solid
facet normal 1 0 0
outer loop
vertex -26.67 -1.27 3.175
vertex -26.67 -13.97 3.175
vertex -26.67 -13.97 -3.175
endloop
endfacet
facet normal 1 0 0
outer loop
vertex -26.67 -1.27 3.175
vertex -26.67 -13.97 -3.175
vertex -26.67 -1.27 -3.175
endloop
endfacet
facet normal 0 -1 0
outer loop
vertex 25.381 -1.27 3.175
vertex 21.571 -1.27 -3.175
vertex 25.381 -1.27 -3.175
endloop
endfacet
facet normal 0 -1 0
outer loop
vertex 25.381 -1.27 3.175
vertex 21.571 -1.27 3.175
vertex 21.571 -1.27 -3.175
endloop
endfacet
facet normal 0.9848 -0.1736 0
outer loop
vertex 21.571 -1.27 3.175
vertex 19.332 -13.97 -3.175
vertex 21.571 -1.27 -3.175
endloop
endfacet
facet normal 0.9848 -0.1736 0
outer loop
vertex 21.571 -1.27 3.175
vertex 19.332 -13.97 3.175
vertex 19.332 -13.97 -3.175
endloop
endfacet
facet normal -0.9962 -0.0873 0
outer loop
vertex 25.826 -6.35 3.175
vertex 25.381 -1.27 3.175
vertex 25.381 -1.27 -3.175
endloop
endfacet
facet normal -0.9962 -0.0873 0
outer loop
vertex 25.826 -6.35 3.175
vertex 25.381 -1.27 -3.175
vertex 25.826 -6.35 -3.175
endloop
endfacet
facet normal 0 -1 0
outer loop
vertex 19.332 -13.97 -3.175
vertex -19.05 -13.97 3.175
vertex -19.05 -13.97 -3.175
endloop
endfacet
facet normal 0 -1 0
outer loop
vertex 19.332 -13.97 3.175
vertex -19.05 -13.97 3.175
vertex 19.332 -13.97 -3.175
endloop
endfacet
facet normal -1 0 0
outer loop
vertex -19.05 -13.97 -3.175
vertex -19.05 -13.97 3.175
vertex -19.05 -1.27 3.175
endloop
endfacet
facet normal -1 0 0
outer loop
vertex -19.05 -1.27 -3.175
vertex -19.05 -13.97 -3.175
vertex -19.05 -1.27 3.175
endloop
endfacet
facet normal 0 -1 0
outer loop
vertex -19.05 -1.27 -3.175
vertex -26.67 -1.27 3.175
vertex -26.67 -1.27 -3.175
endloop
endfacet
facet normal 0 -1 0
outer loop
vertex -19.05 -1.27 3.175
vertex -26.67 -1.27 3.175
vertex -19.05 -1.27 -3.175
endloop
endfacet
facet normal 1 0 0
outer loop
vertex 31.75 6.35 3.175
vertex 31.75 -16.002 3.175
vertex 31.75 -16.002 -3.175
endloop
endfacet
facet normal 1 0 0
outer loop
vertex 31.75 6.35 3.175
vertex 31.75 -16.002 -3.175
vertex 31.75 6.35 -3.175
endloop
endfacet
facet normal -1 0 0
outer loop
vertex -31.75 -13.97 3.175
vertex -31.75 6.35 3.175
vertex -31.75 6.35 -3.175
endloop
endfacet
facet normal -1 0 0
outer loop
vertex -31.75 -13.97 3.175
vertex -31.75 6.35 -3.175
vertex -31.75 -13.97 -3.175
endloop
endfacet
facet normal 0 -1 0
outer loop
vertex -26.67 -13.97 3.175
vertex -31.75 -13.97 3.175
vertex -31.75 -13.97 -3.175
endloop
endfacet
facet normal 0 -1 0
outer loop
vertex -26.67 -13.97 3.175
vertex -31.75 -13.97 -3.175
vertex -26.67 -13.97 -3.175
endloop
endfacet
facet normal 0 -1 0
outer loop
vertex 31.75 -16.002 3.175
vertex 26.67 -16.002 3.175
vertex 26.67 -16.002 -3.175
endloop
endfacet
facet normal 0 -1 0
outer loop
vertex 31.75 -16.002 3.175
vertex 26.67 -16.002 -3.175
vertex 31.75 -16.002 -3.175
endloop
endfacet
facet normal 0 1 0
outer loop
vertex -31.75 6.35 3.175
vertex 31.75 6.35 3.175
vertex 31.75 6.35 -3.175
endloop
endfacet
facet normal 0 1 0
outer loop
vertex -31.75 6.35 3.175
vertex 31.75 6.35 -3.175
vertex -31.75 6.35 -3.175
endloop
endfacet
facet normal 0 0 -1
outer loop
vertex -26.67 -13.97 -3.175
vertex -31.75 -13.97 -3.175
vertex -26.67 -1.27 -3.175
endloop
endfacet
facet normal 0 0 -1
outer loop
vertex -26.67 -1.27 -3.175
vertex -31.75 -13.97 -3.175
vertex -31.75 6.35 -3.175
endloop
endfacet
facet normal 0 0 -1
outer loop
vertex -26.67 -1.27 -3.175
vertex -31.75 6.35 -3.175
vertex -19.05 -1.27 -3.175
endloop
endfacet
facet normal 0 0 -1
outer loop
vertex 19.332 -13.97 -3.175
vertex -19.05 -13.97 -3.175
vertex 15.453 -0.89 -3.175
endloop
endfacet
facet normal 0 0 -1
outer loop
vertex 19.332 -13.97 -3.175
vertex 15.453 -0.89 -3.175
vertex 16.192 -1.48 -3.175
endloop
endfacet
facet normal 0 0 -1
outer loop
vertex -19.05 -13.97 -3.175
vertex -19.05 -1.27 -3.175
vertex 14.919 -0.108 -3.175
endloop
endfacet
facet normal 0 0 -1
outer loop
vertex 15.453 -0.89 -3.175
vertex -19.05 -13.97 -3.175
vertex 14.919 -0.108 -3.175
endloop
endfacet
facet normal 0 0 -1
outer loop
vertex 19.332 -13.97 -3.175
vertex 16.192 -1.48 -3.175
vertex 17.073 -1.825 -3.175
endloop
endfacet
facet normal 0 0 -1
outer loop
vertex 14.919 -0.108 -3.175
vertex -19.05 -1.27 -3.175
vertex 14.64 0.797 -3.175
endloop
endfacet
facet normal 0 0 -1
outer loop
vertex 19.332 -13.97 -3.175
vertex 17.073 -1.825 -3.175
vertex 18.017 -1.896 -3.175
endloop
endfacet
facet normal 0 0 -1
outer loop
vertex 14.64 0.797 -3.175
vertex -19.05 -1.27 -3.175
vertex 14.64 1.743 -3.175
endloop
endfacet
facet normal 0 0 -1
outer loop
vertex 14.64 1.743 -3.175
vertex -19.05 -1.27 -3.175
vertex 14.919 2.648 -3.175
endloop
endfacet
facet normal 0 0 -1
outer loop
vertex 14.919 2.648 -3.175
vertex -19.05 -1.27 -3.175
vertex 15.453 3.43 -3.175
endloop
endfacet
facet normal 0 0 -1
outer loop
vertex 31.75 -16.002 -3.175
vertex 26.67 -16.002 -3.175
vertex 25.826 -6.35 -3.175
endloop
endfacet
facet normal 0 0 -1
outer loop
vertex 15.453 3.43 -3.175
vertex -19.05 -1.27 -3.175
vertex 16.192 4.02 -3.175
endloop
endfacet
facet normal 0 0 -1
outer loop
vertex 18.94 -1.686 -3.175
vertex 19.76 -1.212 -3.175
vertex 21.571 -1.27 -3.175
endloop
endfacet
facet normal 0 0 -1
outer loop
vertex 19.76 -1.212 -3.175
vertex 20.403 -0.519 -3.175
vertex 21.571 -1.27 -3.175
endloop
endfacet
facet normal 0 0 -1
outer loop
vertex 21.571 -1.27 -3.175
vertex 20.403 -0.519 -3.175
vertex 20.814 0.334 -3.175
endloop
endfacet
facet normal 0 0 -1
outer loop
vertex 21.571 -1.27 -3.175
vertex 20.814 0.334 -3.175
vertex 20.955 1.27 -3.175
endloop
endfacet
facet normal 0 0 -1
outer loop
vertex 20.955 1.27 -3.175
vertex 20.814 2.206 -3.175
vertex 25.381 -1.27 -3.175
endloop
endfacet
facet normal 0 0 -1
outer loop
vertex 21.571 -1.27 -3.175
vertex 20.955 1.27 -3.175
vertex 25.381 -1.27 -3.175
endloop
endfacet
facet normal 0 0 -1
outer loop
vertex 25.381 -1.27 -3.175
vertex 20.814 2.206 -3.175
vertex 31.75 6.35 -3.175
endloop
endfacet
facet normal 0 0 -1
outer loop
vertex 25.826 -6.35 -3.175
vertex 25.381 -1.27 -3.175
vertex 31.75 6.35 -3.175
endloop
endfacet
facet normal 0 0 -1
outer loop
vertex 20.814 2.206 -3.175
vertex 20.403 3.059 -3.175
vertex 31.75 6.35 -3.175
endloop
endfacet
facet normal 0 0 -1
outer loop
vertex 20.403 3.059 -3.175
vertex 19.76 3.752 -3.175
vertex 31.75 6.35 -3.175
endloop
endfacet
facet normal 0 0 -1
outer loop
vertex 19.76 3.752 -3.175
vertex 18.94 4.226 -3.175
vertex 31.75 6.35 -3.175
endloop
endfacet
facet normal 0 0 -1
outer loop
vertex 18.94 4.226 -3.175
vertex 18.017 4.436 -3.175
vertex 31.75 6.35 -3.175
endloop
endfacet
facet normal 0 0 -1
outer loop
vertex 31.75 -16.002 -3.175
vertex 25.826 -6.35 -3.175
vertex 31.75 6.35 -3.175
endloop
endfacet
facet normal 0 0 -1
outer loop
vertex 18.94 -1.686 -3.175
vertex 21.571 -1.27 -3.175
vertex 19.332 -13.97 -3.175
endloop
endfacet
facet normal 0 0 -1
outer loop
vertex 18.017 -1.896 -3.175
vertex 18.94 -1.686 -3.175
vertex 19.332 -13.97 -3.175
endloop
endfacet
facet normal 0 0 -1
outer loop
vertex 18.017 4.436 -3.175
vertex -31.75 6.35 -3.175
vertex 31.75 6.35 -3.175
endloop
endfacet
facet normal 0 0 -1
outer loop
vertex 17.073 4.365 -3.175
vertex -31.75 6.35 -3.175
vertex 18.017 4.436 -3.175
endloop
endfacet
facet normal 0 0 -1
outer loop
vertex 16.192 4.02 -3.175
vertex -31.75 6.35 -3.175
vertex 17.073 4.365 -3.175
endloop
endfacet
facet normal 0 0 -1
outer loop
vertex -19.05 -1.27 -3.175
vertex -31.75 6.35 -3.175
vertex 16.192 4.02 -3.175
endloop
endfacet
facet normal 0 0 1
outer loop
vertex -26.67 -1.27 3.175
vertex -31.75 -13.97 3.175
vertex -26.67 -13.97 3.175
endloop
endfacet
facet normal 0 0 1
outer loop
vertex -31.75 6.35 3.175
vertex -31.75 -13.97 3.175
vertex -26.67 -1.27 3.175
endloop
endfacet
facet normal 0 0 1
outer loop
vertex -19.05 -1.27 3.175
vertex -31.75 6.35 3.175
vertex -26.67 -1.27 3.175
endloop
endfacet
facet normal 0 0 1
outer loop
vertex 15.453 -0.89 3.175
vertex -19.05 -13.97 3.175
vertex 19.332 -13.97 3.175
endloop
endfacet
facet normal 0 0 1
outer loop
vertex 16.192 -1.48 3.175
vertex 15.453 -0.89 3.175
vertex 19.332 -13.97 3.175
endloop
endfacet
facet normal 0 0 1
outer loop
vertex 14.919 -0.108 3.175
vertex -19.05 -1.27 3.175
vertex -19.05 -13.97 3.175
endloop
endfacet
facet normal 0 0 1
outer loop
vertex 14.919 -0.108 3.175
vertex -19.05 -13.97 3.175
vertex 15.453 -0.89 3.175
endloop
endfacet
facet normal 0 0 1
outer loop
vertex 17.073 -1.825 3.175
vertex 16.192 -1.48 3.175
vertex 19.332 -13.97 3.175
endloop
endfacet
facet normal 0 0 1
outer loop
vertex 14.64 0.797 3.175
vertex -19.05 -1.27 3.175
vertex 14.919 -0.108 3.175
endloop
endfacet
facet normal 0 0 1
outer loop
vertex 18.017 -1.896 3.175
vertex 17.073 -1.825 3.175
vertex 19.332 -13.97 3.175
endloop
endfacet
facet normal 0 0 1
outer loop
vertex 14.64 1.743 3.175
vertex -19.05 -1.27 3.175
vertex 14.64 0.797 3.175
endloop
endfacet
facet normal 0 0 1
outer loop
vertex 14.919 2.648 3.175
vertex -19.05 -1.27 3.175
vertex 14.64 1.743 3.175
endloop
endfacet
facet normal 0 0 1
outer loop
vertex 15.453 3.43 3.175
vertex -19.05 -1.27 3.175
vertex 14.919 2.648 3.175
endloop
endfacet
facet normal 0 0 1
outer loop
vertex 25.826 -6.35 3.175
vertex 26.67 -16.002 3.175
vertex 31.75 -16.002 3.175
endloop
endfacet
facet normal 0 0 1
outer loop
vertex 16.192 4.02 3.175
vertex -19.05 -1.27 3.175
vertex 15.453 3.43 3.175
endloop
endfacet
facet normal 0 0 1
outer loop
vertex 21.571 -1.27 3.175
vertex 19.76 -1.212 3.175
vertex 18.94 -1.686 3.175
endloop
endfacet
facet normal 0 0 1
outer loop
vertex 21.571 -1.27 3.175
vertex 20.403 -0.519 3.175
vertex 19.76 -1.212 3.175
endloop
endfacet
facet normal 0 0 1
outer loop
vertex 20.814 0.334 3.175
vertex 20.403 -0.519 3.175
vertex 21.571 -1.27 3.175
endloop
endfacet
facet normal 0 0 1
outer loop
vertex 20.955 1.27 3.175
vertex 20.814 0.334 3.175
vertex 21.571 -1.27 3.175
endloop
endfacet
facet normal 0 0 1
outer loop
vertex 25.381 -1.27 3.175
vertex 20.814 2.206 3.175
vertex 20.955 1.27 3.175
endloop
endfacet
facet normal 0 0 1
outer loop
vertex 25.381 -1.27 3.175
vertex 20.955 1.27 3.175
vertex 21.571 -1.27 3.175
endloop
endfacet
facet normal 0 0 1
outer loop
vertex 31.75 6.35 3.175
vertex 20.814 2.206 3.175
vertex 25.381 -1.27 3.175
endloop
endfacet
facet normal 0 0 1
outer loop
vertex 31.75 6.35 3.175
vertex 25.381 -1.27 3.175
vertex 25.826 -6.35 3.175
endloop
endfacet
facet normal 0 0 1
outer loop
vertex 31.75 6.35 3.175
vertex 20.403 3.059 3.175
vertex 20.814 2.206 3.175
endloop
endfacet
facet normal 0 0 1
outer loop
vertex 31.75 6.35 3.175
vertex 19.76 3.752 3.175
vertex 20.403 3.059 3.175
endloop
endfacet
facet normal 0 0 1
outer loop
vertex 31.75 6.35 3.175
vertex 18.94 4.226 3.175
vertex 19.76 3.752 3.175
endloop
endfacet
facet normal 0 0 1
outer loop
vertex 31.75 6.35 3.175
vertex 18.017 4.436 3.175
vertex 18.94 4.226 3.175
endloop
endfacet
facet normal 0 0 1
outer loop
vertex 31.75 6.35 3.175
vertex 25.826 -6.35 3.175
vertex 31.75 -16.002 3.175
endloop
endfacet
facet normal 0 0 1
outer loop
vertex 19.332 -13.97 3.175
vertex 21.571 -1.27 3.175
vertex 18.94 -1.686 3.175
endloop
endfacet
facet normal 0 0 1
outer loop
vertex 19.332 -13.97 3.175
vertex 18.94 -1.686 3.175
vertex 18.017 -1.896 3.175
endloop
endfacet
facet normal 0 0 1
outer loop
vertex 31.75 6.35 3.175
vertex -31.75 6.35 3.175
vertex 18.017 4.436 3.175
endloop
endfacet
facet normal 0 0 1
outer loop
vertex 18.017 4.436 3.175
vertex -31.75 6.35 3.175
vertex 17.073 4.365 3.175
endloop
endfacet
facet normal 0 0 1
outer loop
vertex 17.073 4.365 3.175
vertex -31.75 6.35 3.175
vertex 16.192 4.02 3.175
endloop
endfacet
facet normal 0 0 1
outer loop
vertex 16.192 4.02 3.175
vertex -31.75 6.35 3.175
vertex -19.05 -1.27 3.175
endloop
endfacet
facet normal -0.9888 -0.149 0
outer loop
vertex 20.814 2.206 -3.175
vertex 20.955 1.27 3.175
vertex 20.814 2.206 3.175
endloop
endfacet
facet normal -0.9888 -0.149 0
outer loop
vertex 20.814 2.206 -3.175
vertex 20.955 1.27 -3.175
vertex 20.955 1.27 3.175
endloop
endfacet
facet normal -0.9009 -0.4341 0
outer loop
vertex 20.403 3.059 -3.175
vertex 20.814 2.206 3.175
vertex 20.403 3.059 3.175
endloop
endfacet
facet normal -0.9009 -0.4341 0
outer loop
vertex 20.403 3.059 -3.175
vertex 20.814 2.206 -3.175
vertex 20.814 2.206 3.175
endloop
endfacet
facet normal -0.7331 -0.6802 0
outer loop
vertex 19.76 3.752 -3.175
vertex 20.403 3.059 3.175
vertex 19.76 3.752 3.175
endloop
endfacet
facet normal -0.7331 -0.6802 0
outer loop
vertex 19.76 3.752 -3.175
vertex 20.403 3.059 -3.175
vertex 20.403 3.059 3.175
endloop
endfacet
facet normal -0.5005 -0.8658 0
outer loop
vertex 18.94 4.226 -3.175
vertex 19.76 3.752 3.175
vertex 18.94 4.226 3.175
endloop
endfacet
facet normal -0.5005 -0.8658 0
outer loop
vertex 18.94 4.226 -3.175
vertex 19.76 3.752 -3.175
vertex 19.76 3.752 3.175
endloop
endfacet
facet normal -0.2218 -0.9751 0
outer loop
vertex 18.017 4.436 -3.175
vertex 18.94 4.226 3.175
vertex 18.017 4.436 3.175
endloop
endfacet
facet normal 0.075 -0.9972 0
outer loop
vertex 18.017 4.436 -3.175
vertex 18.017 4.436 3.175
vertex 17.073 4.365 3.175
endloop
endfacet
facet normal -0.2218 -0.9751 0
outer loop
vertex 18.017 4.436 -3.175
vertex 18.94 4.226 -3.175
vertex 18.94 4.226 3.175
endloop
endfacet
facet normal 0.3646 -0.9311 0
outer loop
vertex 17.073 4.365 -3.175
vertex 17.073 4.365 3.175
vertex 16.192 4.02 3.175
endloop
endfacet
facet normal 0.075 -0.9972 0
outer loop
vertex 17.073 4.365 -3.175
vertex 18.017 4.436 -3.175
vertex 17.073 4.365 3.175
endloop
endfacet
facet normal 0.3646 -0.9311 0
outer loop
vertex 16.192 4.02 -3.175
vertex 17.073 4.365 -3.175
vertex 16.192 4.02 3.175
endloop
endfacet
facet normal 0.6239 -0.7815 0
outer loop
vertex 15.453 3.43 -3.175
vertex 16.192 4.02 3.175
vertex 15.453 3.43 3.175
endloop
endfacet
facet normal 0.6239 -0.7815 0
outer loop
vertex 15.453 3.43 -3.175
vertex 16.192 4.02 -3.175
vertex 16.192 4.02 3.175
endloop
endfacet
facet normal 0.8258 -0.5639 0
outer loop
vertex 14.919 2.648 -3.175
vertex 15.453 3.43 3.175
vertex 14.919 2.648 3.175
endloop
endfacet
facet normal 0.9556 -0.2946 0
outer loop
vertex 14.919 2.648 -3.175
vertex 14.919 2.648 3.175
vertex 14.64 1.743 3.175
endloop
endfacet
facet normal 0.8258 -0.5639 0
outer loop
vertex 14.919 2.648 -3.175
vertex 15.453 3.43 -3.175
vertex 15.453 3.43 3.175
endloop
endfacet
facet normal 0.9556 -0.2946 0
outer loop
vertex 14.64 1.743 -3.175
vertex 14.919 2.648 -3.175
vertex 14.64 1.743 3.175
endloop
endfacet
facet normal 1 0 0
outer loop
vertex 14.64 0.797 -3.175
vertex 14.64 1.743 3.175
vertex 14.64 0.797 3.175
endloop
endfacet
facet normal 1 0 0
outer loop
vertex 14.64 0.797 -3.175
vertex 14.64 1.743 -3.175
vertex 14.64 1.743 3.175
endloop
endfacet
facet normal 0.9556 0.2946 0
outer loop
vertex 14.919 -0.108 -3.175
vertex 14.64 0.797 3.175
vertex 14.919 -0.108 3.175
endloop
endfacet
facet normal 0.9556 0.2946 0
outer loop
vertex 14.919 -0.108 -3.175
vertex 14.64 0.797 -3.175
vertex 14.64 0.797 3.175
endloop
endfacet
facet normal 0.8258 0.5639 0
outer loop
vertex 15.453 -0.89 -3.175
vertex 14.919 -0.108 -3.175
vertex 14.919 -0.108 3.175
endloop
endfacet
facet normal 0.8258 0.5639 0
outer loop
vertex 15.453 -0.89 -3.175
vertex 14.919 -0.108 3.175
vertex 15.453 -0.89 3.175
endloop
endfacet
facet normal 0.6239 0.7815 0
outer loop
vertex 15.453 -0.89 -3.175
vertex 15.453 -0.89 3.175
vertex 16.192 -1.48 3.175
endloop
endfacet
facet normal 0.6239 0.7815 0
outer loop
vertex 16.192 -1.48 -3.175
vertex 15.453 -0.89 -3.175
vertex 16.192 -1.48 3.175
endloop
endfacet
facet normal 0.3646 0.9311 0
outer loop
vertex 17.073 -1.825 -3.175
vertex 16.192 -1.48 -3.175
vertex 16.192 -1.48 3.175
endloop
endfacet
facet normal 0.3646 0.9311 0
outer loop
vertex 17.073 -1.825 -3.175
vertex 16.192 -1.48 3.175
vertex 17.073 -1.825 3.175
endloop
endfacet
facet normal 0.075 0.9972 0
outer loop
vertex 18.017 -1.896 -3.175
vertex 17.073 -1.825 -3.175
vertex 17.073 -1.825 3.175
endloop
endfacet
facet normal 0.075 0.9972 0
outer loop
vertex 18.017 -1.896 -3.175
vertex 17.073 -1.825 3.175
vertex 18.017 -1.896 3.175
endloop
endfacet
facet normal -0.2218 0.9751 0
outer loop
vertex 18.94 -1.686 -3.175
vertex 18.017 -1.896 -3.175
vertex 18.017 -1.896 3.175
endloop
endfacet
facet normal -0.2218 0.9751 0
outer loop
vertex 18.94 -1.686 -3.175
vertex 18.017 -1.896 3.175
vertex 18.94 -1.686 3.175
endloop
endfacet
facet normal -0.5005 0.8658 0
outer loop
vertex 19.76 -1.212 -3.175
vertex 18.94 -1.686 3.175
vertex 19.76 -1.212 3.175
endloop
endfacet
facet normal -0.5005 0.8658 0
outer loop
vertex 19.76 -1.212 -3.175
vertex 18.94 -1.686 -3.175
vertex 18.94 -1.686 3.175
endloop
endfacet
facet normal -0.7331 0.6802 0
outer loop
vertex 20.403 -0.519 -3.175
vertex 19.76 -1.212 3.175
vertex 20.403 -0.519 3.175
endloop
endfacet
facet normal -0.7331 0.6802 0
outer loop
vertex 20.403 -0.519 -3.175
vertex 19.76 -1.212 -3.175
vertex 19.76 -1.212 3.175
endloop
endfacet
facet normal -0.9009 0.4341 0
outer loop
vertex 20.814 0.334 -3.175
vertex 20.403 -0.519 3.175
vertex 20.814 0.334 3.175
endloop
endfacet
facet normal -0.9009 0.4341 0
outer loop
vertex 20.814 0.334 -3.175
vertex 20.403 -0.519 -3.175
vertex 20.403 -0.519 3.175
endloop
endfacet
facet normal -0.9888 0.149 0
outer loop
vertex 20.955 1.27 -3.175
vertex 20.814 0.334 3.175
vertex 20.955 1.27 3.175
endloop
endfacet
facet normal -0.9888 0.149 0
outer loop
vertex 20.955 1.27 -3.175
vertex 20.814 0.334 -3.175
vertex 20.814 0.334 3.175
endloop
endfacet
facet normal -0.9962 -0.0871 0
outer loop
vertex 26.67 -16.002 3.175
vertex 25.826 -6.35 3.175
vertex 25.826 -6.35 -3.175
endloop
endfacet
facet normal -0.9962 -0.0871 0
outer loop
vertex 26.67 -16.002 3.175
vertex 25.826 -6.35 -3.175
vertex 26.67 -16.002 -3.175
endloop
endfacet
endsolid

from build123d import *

# Parameters (mm, degrees)
SKETCH1_R           = 3.175
BOSS_EXTRUDE1_DEPTH = 3.175
SKETCH2_W           = 7.62
SKETCH2_H           = 12.7
CUT_EXTRUDE1_DEPTH  = 7.35


with BuildPart() as part:
    # Sketch1 → Boss-Extrude1 (new body, symmetric)
    with BuildSketch(Plane.XY):
        Polygon((21.571117009, -1.27), (25.381117009, -1.27), (25.82555942, -6.35), (31.75, -6.35), (31.75, 6.35), (0, 6.35), (-6.35, 6.35), (-31.75, 6.35), (-31.75, -6.35), (20.675375947, -6.35), align=None)
        with Locations((17.78, 1.27)):
            Circle(SKETCH1_R, mode=Mode.SUBTRACT)
        Polygon((19.331764354, -13.97), (20.675375947, -6.35), (-31.75, -6.35), (-31.75, -13.97), align=None)
        Polygon((31.75, -6.35), (25.82555942, -6.35), (26.67, -16.002), (31.75, -16.002), align=None)
    extrude(amount=BOSS_EXTRUDE1_DEPTH, both=True)

    # Sketch2 → Cut-Extrude1 (cut, through all)
    with BuildSketch(Plane.XY.offset(3.175)):
        with Locations((-22.86, -7.62)):
            Rectangle(SKETCH2_W, SKETCH2_H)
    extrude(amount=-CUT_EXTRUDE1_DEPTH, mode=Mode.SUBTRACT)


solid = part.part
